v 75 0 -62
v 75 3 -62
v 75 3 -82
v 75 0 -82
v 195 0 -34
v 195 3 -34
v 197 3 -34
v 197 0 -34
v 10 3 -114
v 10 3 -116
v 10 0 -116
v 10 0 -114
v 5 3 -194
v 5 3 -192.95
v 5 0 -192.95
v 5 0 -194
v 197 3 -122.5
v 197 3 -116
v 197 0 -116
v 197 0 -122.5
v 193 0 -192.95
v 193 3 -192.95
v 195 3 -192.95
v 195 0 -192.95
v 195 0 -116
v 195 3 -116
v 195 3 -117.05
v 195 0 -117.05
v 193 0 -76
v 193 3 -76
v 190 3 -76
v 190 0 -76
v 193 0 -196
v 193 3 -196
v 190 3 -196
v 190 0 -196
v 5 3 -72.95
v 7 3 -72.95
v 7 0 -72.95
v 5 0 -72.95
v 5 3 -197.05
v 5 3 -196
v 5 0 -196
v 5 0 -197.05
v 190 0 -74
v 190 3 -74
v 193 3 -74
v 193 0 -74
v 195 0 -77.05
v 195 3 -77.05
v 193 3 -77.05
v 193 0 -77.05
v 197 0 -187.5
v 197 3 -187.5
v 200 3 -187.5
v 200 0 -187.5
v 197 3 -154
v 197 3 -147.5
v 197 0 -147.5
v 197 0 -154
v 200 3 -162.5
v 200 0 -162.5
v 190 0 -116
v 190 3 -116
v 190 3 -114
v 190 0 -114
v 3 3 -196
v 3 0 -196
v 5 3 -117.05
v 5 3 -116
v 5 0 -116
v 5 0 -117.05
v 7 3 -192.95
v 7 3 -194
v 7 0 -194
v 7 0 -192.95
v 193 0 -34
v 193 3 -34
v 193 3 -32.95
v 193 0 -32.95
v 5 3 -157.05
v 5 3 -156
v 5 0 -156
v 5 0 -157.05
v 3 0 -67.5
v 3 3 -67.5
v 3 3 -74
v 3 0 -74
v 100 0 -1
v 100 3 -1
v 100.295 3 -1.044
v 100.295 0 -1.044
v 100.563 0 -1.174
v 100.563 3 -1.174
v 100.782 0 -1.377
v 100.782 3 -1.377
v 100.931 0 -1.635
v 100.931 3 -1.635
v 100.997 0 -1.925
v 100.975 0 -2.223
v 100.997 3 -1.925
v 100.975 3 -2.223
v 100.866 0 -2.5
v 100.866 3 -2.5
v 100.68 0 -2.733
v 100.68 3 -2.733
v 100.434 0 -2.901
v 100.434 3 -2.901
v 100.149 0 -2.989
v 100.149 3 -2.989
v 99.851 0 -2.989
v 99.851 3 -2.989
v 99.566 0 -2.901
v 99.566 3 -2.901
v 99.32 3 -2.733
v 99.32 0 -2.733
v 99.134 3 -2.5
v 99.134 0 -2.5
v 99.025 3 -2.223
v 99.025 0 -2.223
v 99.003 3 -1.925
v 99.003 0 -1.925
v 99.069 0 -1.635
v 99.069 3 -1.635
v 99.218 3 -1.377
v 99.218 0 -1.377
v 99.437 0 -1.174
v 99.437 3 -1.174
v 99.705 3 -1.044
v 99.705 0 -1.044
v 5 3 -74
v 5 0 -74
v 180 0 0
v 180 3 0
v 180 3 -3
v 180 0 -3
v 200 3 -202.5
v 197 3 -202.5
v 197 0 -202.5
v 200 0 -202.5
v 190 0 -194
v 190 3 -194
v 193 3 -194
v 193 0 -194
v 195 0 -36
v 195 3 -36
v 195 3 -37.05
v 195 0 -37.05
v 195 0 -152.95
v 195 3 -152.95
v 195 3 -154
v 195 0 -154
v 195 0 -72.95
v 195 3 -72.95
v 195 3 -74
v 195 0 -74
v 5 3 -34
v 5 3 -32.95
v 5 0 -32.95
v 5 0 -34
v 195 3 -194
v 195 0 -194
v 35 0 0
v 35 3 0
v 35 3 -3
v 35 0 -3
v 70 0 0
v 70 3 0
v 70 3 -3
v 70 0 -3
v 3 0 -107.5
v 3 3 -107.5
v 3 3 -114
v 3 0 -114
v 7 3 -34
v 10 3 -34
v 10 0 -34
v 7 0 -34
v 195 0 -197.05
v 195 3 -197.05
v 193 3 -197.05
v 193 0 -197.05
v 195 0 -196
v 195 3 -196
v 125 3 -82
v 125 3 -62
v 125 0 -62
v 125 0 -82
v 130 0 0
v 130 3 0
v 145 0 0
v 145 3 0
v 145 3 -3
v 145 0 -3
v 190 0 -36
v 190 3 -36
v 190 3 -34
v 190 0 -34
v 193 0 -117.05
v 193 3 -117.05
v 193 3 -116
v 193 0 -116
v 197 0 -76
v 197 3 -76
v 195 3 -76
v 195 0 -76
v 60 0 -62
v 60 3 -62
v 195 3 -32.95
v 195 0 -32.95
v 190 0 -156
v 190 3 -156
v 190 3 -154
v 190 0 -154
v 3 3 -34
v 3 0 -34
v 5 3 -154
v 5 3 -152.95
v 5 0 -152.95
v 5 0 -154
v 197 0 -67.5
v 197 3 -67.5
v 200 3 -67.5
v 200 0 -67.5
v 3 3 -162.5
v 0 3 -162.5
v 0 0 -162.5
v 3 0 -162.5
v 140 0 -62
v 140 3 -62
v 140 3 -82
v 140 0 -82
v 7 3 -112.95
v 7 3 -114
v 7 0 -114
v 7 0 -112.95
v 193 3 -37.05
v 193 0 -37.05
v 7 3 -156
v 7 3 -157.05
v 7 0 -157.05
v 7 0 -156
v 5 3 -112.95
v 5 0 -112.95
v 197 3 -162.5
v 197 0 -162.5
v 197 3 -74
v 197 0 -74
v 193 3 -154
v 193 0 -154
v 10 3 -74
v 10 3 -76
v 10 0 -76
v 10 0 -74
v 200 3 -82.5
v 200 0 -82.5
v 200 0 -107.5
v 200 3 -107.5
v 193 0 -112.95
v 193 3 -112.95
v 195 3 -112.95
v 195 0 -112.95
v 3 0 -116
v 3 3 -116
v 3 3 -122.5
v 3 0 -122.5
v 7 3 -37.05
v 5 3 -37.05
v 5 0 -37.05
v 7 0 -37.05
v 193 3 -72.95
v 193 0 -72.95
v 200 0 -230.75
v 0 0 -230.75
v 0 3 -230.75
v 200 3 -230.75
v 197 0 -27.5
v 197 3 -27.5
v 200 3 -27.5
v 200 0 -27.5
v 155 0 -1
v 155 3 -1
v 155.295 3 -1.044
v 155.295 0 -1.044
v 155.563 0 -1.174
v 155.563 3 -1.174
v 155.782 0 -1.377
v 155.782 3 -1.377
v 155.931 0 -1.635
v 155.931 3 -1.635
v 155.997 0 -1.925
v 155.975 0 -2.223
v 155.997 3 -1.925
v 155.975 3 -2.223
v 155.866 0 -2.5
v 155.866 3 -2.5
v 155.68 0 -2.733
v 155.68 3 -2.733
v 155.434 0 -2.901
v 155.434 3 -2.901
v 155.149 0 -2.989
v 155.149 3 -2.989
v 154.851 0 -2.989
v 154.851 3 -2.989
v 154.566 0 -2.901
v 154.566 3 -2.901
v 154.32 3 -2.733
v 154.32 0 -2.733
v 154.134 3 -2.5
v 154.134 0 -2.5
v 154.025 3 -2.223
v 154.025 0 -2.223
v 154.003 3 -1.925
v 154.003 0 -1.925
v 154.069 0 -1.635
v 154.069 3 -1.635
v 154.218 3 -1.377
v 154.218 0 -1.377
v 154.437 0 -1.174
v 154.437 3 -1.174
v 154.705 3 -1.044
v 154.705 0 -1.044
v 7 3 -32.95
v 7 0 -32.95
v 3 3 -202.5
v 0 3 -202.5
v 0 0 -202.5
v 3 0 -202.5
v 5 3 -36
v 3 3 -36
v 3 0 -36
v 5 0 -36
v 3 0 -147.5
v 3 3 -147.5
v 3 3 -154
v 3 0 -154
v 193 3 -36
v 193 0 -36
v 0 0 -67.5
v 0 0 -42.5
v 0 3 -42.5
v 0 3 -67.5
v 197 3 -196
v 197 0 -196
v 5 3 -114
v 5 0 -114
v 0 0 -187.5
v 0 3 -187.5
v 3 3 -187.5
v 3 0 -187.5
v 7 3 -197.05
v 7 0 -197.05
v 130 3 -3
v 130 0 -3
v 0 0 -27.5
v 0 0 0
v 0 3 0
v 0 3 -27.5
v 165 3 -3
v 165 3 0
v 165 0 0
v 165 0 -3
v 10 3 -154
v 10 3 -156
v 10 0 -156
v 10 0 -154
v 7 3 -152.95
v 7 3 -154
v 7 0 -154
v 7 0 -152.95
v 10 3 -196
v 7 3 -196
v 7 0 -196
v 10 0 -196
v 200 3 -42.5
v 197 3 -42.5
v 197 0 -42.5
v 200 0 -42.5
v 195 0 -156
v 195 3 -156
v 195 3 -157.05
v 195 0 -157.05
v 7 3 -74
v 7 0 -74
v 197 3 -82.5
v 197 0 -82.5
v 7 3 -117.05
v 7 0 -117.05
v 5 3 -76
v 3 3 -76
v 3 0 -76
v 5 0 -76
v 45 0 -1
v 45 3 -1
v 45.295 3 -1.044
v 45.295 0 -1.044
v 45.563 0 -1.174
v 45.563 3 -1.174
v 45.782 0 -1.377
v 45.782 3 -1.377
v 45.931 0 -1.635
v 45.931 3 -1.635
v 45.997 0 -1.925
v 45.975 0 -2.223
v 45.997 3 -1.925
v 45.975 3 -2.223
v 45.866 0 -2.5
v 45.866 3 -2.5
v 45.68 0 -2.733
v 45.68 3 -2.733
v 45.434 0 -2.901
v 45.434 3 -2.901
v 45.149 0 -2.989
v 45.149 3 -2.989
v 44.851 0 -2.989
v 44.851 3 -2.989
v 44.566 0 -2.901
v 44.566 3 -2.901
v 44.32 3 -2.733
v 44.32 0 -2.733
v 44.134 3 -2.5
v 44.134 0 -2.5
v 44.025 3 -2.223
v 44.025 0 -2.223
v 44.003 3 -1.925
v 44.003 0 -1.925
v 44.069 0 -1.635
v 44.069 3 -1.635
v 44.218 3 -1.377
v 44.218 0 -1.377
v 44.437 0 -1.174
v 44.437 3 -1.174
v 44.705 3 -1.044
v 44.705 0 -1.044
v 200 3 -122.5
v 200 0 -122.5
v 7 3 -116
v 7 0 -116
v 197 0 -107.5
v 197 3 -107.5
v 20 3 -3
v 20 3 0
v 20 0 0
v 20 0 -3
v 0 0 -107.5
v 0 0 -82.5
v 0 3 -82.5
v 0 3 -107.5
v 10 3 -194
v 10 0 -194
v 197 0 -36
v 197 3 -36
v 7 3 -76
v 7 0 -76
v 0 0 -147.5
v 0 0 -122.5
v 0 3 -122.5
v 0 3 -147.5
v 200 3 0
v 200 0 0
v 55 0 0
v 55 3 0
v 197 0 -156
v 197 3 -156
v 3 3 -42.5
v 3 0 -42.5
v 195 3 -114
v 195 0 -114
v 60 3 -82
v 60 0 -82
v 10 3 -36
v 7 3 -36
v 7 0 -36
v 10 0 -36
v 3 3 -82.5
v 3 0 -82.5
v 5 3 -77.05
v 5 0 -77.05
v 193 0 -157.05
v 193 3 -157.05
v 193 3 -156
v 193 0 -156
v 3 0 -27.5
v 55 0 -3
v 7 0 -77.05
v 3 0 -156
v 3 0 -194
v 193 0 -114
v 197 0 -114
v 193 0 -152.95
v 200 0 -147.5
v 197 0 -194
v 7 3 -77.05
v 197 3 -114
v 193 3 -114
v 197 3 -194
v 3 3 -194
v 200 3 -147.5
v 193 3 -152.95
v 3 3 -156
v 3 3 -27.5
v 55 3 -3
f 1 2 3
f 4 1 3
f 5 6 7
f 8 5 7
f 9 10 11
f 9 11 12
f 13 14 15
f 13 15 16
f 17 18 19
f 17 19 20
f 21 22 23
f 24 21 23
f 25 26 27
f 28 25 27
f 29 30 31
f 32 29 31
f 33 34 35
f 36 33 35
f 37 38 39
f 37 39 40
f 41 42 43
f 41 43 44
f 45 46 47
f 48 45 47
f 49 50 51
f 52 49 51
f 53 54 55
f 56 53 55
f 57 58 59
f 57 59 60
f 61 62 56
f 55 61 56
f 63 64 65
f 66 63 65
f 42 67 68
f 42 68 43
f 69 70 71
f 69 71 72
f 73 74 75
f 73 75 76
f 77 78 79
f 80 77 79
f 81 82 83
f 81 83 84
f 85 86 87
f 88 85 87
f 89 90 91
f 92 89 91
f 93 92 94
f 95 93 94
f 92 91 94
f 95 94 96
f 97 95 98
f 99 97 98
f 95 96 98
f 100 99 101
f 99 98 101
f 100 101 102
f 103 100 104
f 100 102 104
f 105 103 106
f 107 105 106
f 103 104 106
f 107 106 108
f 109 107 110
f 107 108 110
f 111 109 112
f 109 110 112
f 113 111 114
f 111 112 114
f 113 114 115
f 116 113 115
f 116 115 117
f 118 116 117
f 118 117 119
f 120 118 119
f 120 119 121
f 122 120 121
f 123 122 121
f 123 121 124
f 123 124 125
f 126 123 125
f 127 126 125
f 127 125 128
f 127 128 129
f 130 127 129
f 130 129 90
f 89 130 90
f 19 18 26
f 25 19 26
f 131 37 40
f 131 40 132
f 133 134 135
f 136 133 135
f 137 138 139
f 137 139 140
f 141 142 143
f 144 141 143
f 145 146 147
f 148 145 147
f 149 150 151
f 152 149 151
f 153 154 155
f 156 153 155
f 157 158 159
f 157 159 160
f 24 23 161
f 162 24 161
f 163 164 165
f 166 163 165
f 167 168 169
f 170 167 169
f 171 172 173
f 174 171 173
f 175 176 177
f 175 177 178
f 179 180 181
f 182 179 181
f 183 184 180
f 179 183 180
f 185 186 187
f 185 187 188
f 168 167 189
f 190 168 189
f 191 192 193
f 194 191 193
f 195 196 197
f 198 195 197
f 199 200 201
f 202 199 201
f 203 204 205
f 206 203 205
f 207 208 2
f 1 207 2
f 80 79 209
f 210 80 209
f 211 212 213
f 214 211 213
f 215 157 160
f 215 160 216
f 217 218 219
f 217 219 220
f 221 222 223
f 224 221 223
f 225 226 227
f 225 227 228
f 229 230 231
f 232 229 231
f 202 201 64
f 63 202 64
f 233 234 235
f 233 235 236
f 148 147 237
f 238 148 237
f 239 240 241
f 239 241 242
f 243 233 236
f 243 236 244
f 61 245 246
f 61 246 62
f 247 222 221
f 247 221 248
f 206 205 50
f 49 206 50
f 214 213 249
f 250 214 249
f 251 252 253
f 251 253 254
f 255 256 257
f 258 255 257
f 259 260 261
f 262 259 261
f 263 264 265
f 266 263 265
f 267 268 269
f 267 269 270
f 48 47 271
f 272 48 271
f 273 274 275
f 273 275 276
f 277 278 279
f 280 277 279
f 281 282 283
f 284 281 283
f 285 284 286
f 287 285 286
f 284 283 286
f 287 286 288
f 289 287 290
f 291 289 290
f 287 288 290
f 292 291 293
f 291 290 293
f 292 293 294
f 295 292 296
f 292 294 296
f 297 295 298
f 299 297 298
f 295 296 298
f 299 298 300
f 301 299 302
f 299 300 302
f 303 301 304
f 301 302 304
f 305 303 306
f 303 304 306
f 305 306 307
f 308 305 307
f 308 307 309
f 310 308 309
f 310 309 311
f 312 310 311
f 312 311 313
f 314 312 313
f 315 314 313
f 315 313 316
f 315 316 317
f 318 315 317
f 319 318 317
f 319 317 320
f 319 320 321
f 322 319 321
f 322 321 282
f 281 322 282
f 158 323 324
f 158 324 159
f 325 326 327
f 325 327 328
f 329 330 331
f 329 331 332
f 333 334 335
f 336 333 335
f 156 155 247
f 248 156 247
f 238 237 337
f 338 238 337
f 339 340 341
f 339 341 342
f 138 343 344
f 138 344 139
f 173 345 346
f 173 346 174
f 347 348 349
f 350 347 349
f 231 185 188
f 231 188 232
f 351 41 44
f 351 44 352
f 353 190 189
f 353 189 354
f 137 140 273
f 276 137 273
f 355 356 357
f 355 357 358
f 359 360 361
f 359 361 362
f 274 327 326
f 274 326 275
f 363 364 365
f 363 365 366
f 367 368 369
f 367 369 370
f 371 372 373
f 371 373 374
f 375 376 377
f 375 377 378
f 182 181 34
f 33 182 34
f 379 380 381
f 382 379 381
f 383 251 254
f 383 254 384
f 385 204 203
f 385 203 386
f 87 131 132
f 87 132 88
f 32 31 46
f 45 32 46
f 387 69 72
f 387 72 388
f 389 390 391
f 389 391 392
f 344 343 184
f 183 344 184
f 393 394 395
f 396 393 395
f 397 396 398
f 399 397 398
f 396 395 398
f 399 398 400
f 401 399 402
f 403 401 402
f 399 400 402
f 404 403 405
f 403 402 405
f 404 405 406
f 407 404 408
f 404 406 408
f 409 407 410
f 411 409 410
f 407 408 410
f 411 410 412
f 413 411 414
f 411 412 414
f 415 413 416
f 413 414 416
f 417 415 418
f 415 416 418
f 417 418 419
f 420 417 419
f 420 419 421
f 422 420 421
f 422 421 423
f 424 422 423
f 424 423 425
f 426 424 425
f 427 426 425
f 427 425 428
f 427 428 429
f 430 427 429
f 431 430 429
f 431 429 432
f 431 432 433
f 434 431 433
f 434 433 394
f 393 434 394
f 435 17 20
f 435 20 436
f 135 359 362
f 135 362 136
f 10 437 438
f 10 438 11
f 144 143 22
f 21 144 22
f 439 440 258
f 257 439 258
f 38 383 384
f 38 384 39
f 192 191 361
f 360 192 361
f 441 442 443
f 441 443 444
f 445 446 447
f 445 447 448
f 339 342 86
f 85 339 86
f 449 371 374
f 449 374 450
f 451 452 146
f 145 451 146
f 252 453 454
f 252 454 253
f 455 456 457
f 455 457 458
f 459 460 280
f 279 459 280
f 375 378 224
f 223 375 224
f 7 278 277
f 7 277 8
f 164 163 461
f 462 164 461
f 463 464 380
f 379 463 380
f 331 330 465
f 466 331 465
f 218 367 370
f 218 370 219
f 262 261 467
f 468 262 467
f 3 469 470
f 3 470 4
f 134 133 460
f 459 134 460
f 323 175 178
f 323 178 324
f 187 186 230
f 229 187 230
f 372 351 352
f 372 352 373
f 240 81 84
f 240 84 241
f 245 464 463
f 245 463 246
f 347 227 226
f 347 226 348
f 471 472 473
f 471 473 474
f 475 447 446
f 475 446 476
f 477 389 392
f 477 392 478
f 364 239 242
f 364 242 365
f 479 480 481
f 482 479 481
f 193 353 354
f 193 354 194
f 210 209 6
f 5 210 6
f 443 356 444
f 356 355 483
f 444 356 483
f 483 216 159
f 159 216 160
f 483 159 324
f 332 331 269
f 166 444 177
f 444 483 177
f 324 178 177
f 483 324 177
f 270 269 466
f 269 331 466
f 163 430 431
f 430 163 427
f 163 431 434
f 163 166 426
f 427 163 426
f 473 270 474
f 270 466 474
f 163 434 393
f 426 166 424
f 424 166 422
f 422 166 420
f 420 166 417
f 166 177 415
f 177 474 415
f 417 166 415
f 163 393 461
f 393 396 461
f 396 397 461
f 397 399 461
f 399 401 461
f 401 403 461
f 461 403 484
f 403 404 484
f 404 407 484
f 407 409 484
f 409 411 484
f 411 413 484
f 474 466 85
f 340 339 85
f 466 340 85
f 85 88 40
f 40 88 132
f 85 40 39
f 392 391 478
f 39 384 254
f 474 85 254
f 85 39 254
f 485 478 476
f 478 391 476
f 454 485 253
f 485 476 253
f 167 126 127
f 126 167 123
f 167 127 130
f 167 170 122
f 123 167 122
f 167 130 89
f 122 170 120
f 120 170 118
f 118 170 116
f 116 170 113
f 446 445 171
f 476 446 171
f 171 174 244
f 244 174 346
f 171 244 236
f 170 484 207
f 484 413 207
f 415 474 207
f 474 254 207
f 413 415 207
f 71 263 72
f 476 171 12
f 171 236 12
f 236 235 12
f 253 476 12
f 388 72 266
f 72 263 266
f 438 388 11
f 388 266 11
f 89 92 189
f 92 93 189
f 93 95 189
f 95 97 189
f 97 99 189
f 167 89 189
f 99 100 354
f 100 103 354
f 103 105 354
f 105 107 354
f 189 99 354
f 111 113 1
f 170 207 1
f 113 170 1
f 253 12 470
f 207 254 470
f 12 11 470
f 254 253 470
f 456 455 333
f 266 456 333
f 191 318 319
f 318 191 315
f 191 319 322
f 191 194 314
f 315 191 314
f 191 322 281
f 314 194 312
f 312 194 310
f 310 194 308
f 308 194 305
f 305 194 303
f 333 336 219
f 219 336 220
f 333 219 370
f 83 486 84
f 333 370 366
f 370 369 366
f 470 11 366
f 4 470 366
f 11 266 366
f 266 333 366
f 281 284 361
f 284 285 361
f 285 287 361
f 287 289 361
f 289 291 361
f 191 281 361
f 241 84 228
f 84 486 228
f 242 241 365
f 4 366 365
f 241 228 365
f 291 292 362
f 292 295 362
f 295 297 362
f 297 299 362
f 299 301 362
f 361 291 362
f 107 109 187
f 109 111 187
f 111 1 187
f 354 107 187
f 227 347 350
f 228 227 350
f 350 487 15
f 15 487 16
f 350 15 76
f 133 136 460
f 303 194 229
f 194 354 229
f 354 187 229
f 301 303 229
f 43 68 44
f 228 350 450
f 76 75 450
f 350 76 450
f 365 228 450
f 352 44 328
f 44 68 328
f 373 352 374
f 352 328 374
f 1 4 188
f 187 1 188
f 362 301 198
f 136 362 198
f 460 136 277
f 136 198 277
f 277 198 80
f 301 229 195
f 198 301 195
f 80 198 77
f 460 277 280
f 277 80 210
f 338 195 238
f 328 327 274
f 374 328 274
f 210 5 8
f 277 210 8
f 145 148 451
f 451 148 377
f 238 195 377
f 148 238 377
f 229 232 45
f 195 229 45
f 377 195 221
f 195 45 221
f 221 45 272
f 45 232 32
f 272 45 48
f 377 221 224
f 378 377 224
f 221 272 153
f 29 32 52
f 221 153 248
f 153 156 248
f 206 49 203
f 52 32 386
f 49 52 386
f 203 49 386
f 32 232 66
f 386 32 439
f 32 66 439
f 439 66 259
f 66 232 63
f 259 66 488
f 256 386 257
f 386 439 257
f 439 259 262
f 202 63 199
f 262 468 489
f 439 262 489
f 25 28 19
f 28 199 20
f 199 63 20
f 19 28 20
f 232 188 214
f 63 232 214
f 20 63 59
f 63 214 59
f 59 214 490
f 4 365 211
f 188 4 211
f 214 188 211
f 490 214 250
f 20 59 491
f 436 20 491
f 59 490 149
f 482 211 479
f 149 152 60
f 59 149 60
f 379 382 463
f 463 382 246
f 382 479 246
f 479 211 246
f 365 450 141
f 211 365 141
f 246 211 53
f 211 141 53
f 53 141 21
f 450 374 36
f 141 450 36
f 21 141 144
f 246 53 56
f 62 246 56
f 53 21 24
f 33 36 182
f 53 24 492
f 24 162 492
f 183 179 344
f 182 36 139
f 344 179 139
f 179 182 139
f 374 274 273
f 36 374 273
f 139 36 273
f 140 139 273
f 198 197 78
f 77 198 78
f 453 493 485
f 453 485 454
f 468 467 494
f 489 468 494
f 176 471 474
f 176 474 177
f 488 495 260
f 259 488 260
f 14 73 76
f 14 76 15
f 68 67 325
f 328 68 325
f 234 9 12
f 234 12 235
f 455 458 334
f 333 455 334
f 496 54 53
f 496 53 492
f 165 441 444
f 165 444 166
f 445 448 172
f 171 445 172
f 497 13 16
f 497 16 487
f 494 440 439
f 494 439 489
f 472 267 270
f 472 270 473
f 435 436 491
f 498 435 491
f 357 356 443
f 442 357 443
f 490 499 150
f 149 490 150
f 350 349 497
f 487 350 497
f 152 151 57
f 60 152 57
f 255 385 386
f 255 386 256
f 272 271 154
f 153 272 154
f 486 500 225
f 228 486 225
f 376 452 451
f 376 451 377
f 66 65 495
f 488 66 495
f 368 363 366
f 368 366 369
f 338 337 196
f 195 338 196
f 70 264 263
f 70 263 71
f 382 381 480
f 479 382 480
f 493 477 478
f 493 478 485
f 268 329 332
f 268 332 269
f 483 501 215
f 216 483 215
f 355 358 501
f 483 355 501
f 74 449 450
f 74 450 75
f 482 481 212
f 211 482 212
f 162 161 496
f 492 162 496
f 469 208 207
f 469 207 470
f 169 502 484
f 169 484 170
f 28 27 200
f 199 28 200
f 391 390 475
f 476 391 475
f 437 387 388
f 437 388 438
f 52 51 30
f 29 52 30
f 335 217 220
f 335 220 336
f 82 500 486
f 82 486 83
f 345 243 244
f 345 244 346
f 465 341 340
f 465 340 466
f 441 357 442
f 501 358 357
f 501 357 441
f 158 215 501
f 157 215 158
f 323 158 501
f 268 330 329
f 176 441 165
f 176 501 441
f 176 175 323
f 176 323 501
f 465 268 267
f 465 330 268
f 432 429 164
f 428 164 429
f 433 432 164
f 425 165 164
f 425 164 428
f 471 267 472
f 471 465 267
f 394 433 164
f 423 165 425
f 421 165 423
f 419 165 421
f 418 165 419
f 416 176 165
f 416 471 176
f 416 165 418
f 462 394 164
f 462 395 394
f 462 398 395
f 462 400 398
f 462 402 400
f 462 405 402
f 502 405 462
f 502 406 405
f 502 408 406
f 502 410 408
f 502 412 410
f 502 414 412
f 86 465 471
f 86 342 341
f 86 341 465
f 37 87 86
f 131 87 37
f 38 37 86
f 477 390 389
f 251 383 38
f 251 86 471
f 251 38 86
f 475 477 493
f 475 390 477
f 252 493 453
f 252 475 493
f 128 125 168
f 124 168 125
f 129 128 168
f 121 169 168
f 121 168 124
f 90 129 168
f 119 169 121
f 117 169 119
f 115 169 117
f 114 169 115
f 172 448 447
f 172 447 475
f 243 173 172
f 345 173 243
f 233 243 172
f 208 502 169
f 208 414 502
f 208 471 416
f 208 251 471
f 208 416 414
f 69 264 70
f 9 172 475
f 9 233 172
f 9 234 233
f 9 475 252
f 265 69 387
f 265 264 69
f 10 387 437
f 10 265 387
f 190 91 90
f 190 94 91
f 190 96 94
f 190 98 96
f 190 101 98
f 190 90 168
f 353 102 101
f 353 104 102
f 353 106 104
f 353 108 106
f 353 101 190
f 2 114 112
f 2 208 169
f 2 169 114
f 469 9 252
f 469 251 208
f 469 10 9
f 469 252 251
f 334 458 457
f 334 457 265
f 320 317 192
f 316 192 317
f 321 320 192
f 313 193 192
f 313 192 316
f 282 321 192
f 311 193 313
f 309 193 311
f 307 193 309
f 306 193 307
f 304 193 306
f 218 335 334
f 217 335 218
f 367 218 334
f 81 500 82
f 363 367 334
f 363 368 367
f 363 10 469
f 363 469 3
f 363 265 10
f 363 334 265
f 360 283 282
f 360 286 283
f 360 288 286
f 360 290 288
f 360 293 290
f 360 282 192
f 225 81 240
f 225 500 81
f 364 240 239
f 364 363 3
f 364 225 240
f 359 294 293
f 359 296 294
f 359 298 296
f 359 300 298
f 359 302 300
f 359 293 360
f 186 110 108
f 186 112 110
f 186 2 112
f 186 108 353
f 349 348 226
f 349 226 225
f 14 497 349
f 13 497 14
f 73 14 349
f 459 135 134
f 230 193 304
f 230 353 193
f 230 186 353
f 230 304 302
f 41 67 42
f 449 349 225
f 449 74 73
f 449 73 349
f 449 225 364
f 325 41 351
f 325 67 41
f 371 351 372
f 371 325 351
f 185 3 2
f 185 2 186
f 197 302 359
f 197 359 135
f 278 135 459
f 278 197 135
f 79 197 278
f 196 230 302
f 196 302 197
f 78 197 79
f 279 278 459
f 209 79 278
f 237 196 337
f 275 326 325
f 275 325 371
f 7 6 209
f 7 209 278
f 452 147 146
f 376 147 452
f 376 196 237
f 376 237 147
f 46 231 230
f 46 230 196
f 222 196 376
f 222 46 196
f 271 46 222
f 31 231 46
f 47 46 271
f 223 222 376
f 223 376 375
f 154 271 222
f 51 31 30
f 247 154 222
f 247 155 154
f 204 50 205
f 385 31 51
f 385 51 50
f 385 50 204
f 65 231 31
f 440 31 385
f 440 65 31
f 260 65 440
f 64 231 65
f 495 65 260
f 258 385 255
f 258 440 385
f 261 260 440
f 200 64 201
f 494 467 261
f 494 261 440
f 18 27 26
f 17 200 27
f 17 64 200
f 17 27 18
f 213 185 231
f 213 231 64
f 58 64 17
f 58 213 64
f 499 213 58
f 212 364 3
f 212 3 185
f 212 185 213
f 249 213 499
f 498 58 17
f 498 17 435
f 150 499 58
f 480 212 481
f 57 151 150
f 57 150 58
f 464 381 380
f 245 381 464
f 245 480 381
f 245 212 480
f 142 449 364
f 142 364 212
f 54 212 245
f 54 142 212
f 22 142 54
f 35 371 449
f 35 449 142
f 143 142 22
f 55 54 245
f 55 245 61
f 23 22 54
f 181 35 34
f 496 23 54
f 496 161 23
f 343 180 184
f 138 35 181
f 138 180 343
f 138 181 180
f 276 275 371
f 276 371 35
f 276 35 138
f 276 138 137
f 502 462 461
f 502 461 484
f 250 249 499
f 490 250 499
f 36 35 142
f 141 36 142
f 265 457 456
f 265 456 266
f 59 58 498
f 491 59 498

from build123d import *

# Parameters (mm, degrees)
SKETCH_1_W             = 200
SKETCH_1_H             = 230.75
EXTRUDE_1_DEPTH        = 3
SKETCH_2_W             = 3
SKETCH_2_H             = 15
CUT_EXTRUDE_1_DEPTH    = 306.37610008
PATTERN_LINEAR_1_COUNT = 5
PATTERN_LINEAR_1_PITCH = 40
SKETCH_3_W             = 15
SKETCH_3_H             = 3
CUT_EXTRUDE_2_DEPTH    = 306.37610008
SKETCH_4_R             = 1
CUT_EXTRUDE_3_DEPTH    = 306.37610008
CUT_EXTRUDE_4_DEPTH    = 306.37610008
PATTERN_LINEAR_2_COUNT = 5
PATTERN_LINEAR_2_PITCH = 40
MIRROR_1_COPY_1_DEPTH  = 306.37610008
MIRROR_1_COPY_2_DEPTH  = 306.37610008
MIRROR_1_COPY_3_DEPTH  = 306.37610008
MIRROR_1_COPY_4_DEPTH  = 306.37610008
SKETCH_6_W             = 15
SKETCH_6_H             = 20
CUT_EXTRUDE_5_DEPTH    = 306.37610008


with BuildPart() as part:
    # 草图1 → 凸台-拉伸1 (new body)
    with BuildSketch(Plane(origin=(0, 0, 0), x_dir=(1, 0, 0), z_dir=(0, 1, 0))):
        with Locations((100, 115.375)):
            Rectangle(SKETCH_1_W, SKETCH_1_H)
    extrude(amount=EXTRUDE_1_DEPTH)

    # 草图2 → 切除-拉伸1 (cut, through all)
    with BuildSketch(Plane(origin=(0, 3, 0), x_dir=(1, 0, 0), z_dir=(0, 1, 0))):
        with Locations((1.5, 195)):
            Rectangle(SKETCH_2_W, SKETCH_2_H)
        with Locations((198.5, 195)):
            Rectangle(SKETCH_2_W, SKETCH_2_H)
    cut_extrude_1 = extrude(amount=-CUT_EXTRUDE_1_DEPTH, mode=Mode.SUBTRACT)

    # 阵列(线性)1: 切除-拉伸1 ×5
    with Locations(*[(0, 0, i * PATTERN_LINEAR_1_PITCH) for i in range(1, PATTERN_LINEAR_1_COUNT)]):
        add(cut_extrude_1, mode=Mode.SUBTRACT)

    # 草图3 → 切除-拉伸2 (cut, through all)
    with BuildSketch(Plane(origin=(0, 3, 0), x_dir=(1, 0, 0), z_dir=(0, 1, 0))):
        with Locations((27.5, 1.5)):
            Rectangle(SKETCH_3_W, SKETCH_3_H)
        with Locations((62.5, 1.5)):
            Rectangle(SKETCH_3_W, SKETCH_3_H)
        with Locations((137.5, 1.5)):
            Rectangle(SKETCH_3_W, SKETCH_3_H)
        with Locations((172.5, 1.5)):
            Rectangle(SKETCH_3_W, SKETCH_3_H)
    extrude(amount=-CUT_EXTRUDE_2_DEPTH, mode=Mode.SUBTRACT)

    # 草图4 → 切除-拉伸3 (cut, through all)
    with BuildSketch(Plane(origin=(0, 3, 0), x_dir=(1, 0, 0), z_dir=(0, 1, 0))):
        with Locations(Location((100, 2, 0), (0, 0, 270))):
            Circle(SKETCH_4_R)
        with Locations(Location((45, 2, 0), (0, 0, 270))):
            Circle(SKETCH_4_R)
        with Locations(Location((155, 2, 0), (0, 0, 270))):
            Circle(SKETCH_4_R)
    extrude(amount=-CUT_EXTRUDE_3_DEPTH, mode=Mode.SUBTRACT)

    # 草图5 → 切除-拉伸4 (cut, through all)
    with BuildSketch(Plane(origin=(0, 3, 0), x_dir=(1, 0, 0), z_dir=(0, 1, 0))):
        Polygon((5, 197.05), (7, 197.05), (7, 196), (10, 196), (10, 194), (7, 194), (7, 192.95), (5, 192.95), (5, 194), (3, 194), (3, 196), (5, 196), align=None)
    cut_extrude_4 = extrude(amount=-CUT_EXTRUDE_4_DEPTH, mode=Mode.SUBTRACT)

    # 阵列(线性)2: 切除-拉伸4 ×5
    with Locations(*[(0, 0, i * PATTERN_LINEAR_2_PITCH) for i in range(1, PATTERN_LINEAR_2_COUNT)]):
        add(cut_extrude_4, mode=Mode.SUBTRACT)

    # 镜向1: 切除-拉伸4 across plane
    add(cut_extrude_4.mirror(Plane.ZY.offset(-100)), mode=Mode.SUBTRACT)

    # 镜向1 copy 1 sketch → 镜向1 copy 1 (cut, through all)
    with BuildSketch(Plane(origin=(200, 3, 40), x_dir=(-1, 0, 0), z_dir=(0, 1, 0))):
        Polygon((5, -197.05), (7, -197.05), (7, -196), (10, -196), (10, -194), (7, -194), (7, -192.95), (5, -192.95), (5, -194), (3, -194), (3, -196), (5, -196), align=None)
    extrude(amount=-MIRROR_1_COPY_1_DEPTH, mode=Mode.SUBTRACT)

    # 镜向1 copy 2 sketch → 镜向1 copy 2 (cut, through all)
    with BuildSketch(Plane(origin=(200, 3, 80), x_dir=(-1, 0, 0), z_dir=(0, 1, 0))):
        Polygon((5, -197.05), (7, -197.05), (7, -196), (10, -196), (10, -194), (7, -194), (7, -192.95), (5, -192.95), (5, -194), (3, -194), (3, -196), (5, -196), align=None)
    extrude(amount=-MIRROR_1_COPY_2_DEPTH, mode=Mode.SUBTRACT)

    # 镜向1 copy 3 sketch → 镜向1 copy 3 (cut, through all)
    with BuildSketch(Plane(origin=(200, 3, 120), x_dir=(-1, 0, 0), z_dir=(0, 1, 0))):
        Polygon((5, -197.05), (7, -197.05), (7, -196), (10, -196), (10, -194), (7, -194), (7, -192.95), (5, -192.95), (5, -194), (3, -194), (3, -196), (5, -196), align=None)
    extrude(amount=-MIRROR_1_COPY_3_DEPTH, mode=Mode.SUBTRACT)

    # 镜向1 copy 4 sketch → 镜向1 copy 4 (cut, through all)
    with BuildSketch(Plane(origin=(200, 3, 160), x_dir=(-1, 0, 0), z_dir=(0, 1, 0))):
        Polygon((5, -197.05), (7, -197.05), (7, -196), (10, -196), (10, -194), (7, -194), (7, -192.95), (5, -192.95), (5, -194), (3, -194), (3, -196), (5, -196), align=None)
    extrude(amount=-MIRROR_1_COPY_4_DEPTH, mode=Mode.SUBTRACT)

    # 草图6 → 切除-拉伸5 (cut, through all)
    with BuildSketch(Plane(origin=(0, 3, 0), x_dir=(1, 0, 0), z_dir=(0, 1, 0))):
        with Locations((67.5, 72)):
            Rectangle(SKETCH_6_W, SKETCH_6_H)
        with Locations((132.5, 72)):
            Rectangle(SKETCH_6_W, SKETCH_6_H)
    extrude(amount=-CUT_EXTRUDE_5_DEPTH, mode=Mode.SUBTRACT)


solid = part.part
